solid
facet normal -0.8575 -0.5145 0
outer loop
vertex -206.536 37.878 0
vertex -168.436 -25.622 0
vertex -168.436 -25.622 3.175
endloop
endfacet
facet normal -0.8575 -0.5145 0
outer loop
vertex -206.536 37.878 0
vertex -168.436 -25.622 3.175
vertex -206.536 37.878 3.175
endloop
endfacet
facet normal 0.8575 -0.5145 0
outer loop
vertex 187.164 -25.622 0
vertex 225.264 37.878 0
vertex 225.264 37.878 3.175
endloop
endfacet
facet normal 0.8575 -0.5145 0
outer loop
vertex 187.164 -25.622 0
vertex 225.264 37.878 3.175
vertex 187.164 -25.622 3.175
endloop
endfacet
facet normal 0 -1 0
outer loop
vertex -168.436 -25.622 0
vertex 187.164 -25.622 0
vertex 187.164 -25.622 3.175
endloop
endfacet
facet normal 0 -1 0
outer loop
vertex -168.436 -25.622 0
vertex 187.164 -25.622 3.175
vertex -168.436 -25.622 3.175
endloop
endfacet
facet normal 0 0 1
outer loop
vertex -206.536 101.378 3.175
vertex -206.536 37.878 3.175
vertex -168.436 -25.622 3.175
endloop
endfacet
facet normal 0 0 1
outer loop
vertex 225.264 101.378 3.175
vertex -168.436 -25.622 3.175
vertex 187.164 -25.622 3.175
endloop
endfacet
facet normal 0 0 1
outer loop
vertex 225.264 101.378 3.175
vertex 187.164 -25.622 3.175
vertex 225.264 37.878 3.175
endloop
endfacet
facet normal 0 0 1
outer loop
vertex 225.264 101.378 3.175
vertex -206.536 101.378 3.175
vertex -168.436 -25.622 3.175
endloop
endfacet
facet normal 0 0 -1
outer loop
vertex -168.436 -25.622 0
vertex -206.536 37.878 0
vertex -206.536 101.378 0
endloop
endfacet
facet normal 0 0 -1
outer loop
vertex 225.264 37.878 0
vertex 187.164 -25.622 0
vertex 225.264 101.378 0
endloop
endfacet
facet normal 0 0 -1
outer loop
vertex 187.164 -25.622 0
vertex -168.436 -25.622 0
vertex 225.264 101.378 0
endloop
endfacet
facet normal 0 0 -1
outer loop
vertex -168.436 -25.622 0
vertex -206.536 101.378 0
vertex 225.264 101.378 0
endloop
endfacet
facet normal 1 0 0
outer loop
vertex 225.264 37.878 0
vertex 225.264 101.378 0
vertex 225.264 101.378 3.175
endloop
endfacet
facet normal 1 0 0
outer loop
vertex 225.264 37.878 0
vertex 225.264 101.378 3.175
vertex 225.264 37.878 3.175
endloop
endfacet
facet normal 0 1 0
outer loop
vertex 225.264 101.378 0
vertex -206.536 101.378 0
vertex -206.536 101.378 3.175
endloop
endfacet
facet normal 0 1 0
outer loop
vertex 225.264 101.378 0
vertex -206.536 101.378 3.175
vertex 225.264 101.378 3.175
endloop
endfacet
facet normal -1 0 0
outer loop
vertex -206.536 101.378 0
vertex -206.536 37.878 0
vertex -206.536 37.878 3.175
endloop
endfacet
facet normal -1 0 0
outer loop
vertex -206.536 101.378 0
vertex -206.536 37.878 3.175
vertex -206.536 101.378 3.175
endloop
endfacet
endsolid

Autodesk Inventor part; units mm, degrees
ref_plane "YZ Plane" through (0, 0, 0) normal (1, 0, 0) x (0, 1, 0)
ref_plane "XZ Plane" through (0, 0, 0) normal (0, 1, 0) x (-1, 0, 0)
ref_plane "XY Plane" through (0, 0, 0) normal (0, 0, 1) x (1, 0, 0)
sketch "Sketch1" plane through (0, 0, 0) normal (0, 0, 1) x (1, 0, 0)
  line L0 (-206.5357, 101.3775) -> (225.2643, 101.3775)
  line L1 (225.2643, 101.3775) -> (225.2643, 37.8775)
  line L2 (225.2643, 37.8775) -> (187.1643, -25.6225)
  line L3 (187.1643, -25.6225) -> (-168.4357, -25.6225)
  line L4 (-168.4357, -25.6225) -> (-206.5357, 37.8775)
  line L5 (-206.5357, 37.8775) -> (-206.5357, 101.3775)
  point P0 (0, 0)
  dimension "d0" = 431.8
  dimension "d1" = 355.6
  dimension "d2" = 63.5
  dimension "d3" = 90
  dimension "d5" = 63.5
  dimension "d7" = 63.5
extrude "Extrusion1" add sketch "Sketch1" along normal blind 3.175
properties part number "Inner Plate"
